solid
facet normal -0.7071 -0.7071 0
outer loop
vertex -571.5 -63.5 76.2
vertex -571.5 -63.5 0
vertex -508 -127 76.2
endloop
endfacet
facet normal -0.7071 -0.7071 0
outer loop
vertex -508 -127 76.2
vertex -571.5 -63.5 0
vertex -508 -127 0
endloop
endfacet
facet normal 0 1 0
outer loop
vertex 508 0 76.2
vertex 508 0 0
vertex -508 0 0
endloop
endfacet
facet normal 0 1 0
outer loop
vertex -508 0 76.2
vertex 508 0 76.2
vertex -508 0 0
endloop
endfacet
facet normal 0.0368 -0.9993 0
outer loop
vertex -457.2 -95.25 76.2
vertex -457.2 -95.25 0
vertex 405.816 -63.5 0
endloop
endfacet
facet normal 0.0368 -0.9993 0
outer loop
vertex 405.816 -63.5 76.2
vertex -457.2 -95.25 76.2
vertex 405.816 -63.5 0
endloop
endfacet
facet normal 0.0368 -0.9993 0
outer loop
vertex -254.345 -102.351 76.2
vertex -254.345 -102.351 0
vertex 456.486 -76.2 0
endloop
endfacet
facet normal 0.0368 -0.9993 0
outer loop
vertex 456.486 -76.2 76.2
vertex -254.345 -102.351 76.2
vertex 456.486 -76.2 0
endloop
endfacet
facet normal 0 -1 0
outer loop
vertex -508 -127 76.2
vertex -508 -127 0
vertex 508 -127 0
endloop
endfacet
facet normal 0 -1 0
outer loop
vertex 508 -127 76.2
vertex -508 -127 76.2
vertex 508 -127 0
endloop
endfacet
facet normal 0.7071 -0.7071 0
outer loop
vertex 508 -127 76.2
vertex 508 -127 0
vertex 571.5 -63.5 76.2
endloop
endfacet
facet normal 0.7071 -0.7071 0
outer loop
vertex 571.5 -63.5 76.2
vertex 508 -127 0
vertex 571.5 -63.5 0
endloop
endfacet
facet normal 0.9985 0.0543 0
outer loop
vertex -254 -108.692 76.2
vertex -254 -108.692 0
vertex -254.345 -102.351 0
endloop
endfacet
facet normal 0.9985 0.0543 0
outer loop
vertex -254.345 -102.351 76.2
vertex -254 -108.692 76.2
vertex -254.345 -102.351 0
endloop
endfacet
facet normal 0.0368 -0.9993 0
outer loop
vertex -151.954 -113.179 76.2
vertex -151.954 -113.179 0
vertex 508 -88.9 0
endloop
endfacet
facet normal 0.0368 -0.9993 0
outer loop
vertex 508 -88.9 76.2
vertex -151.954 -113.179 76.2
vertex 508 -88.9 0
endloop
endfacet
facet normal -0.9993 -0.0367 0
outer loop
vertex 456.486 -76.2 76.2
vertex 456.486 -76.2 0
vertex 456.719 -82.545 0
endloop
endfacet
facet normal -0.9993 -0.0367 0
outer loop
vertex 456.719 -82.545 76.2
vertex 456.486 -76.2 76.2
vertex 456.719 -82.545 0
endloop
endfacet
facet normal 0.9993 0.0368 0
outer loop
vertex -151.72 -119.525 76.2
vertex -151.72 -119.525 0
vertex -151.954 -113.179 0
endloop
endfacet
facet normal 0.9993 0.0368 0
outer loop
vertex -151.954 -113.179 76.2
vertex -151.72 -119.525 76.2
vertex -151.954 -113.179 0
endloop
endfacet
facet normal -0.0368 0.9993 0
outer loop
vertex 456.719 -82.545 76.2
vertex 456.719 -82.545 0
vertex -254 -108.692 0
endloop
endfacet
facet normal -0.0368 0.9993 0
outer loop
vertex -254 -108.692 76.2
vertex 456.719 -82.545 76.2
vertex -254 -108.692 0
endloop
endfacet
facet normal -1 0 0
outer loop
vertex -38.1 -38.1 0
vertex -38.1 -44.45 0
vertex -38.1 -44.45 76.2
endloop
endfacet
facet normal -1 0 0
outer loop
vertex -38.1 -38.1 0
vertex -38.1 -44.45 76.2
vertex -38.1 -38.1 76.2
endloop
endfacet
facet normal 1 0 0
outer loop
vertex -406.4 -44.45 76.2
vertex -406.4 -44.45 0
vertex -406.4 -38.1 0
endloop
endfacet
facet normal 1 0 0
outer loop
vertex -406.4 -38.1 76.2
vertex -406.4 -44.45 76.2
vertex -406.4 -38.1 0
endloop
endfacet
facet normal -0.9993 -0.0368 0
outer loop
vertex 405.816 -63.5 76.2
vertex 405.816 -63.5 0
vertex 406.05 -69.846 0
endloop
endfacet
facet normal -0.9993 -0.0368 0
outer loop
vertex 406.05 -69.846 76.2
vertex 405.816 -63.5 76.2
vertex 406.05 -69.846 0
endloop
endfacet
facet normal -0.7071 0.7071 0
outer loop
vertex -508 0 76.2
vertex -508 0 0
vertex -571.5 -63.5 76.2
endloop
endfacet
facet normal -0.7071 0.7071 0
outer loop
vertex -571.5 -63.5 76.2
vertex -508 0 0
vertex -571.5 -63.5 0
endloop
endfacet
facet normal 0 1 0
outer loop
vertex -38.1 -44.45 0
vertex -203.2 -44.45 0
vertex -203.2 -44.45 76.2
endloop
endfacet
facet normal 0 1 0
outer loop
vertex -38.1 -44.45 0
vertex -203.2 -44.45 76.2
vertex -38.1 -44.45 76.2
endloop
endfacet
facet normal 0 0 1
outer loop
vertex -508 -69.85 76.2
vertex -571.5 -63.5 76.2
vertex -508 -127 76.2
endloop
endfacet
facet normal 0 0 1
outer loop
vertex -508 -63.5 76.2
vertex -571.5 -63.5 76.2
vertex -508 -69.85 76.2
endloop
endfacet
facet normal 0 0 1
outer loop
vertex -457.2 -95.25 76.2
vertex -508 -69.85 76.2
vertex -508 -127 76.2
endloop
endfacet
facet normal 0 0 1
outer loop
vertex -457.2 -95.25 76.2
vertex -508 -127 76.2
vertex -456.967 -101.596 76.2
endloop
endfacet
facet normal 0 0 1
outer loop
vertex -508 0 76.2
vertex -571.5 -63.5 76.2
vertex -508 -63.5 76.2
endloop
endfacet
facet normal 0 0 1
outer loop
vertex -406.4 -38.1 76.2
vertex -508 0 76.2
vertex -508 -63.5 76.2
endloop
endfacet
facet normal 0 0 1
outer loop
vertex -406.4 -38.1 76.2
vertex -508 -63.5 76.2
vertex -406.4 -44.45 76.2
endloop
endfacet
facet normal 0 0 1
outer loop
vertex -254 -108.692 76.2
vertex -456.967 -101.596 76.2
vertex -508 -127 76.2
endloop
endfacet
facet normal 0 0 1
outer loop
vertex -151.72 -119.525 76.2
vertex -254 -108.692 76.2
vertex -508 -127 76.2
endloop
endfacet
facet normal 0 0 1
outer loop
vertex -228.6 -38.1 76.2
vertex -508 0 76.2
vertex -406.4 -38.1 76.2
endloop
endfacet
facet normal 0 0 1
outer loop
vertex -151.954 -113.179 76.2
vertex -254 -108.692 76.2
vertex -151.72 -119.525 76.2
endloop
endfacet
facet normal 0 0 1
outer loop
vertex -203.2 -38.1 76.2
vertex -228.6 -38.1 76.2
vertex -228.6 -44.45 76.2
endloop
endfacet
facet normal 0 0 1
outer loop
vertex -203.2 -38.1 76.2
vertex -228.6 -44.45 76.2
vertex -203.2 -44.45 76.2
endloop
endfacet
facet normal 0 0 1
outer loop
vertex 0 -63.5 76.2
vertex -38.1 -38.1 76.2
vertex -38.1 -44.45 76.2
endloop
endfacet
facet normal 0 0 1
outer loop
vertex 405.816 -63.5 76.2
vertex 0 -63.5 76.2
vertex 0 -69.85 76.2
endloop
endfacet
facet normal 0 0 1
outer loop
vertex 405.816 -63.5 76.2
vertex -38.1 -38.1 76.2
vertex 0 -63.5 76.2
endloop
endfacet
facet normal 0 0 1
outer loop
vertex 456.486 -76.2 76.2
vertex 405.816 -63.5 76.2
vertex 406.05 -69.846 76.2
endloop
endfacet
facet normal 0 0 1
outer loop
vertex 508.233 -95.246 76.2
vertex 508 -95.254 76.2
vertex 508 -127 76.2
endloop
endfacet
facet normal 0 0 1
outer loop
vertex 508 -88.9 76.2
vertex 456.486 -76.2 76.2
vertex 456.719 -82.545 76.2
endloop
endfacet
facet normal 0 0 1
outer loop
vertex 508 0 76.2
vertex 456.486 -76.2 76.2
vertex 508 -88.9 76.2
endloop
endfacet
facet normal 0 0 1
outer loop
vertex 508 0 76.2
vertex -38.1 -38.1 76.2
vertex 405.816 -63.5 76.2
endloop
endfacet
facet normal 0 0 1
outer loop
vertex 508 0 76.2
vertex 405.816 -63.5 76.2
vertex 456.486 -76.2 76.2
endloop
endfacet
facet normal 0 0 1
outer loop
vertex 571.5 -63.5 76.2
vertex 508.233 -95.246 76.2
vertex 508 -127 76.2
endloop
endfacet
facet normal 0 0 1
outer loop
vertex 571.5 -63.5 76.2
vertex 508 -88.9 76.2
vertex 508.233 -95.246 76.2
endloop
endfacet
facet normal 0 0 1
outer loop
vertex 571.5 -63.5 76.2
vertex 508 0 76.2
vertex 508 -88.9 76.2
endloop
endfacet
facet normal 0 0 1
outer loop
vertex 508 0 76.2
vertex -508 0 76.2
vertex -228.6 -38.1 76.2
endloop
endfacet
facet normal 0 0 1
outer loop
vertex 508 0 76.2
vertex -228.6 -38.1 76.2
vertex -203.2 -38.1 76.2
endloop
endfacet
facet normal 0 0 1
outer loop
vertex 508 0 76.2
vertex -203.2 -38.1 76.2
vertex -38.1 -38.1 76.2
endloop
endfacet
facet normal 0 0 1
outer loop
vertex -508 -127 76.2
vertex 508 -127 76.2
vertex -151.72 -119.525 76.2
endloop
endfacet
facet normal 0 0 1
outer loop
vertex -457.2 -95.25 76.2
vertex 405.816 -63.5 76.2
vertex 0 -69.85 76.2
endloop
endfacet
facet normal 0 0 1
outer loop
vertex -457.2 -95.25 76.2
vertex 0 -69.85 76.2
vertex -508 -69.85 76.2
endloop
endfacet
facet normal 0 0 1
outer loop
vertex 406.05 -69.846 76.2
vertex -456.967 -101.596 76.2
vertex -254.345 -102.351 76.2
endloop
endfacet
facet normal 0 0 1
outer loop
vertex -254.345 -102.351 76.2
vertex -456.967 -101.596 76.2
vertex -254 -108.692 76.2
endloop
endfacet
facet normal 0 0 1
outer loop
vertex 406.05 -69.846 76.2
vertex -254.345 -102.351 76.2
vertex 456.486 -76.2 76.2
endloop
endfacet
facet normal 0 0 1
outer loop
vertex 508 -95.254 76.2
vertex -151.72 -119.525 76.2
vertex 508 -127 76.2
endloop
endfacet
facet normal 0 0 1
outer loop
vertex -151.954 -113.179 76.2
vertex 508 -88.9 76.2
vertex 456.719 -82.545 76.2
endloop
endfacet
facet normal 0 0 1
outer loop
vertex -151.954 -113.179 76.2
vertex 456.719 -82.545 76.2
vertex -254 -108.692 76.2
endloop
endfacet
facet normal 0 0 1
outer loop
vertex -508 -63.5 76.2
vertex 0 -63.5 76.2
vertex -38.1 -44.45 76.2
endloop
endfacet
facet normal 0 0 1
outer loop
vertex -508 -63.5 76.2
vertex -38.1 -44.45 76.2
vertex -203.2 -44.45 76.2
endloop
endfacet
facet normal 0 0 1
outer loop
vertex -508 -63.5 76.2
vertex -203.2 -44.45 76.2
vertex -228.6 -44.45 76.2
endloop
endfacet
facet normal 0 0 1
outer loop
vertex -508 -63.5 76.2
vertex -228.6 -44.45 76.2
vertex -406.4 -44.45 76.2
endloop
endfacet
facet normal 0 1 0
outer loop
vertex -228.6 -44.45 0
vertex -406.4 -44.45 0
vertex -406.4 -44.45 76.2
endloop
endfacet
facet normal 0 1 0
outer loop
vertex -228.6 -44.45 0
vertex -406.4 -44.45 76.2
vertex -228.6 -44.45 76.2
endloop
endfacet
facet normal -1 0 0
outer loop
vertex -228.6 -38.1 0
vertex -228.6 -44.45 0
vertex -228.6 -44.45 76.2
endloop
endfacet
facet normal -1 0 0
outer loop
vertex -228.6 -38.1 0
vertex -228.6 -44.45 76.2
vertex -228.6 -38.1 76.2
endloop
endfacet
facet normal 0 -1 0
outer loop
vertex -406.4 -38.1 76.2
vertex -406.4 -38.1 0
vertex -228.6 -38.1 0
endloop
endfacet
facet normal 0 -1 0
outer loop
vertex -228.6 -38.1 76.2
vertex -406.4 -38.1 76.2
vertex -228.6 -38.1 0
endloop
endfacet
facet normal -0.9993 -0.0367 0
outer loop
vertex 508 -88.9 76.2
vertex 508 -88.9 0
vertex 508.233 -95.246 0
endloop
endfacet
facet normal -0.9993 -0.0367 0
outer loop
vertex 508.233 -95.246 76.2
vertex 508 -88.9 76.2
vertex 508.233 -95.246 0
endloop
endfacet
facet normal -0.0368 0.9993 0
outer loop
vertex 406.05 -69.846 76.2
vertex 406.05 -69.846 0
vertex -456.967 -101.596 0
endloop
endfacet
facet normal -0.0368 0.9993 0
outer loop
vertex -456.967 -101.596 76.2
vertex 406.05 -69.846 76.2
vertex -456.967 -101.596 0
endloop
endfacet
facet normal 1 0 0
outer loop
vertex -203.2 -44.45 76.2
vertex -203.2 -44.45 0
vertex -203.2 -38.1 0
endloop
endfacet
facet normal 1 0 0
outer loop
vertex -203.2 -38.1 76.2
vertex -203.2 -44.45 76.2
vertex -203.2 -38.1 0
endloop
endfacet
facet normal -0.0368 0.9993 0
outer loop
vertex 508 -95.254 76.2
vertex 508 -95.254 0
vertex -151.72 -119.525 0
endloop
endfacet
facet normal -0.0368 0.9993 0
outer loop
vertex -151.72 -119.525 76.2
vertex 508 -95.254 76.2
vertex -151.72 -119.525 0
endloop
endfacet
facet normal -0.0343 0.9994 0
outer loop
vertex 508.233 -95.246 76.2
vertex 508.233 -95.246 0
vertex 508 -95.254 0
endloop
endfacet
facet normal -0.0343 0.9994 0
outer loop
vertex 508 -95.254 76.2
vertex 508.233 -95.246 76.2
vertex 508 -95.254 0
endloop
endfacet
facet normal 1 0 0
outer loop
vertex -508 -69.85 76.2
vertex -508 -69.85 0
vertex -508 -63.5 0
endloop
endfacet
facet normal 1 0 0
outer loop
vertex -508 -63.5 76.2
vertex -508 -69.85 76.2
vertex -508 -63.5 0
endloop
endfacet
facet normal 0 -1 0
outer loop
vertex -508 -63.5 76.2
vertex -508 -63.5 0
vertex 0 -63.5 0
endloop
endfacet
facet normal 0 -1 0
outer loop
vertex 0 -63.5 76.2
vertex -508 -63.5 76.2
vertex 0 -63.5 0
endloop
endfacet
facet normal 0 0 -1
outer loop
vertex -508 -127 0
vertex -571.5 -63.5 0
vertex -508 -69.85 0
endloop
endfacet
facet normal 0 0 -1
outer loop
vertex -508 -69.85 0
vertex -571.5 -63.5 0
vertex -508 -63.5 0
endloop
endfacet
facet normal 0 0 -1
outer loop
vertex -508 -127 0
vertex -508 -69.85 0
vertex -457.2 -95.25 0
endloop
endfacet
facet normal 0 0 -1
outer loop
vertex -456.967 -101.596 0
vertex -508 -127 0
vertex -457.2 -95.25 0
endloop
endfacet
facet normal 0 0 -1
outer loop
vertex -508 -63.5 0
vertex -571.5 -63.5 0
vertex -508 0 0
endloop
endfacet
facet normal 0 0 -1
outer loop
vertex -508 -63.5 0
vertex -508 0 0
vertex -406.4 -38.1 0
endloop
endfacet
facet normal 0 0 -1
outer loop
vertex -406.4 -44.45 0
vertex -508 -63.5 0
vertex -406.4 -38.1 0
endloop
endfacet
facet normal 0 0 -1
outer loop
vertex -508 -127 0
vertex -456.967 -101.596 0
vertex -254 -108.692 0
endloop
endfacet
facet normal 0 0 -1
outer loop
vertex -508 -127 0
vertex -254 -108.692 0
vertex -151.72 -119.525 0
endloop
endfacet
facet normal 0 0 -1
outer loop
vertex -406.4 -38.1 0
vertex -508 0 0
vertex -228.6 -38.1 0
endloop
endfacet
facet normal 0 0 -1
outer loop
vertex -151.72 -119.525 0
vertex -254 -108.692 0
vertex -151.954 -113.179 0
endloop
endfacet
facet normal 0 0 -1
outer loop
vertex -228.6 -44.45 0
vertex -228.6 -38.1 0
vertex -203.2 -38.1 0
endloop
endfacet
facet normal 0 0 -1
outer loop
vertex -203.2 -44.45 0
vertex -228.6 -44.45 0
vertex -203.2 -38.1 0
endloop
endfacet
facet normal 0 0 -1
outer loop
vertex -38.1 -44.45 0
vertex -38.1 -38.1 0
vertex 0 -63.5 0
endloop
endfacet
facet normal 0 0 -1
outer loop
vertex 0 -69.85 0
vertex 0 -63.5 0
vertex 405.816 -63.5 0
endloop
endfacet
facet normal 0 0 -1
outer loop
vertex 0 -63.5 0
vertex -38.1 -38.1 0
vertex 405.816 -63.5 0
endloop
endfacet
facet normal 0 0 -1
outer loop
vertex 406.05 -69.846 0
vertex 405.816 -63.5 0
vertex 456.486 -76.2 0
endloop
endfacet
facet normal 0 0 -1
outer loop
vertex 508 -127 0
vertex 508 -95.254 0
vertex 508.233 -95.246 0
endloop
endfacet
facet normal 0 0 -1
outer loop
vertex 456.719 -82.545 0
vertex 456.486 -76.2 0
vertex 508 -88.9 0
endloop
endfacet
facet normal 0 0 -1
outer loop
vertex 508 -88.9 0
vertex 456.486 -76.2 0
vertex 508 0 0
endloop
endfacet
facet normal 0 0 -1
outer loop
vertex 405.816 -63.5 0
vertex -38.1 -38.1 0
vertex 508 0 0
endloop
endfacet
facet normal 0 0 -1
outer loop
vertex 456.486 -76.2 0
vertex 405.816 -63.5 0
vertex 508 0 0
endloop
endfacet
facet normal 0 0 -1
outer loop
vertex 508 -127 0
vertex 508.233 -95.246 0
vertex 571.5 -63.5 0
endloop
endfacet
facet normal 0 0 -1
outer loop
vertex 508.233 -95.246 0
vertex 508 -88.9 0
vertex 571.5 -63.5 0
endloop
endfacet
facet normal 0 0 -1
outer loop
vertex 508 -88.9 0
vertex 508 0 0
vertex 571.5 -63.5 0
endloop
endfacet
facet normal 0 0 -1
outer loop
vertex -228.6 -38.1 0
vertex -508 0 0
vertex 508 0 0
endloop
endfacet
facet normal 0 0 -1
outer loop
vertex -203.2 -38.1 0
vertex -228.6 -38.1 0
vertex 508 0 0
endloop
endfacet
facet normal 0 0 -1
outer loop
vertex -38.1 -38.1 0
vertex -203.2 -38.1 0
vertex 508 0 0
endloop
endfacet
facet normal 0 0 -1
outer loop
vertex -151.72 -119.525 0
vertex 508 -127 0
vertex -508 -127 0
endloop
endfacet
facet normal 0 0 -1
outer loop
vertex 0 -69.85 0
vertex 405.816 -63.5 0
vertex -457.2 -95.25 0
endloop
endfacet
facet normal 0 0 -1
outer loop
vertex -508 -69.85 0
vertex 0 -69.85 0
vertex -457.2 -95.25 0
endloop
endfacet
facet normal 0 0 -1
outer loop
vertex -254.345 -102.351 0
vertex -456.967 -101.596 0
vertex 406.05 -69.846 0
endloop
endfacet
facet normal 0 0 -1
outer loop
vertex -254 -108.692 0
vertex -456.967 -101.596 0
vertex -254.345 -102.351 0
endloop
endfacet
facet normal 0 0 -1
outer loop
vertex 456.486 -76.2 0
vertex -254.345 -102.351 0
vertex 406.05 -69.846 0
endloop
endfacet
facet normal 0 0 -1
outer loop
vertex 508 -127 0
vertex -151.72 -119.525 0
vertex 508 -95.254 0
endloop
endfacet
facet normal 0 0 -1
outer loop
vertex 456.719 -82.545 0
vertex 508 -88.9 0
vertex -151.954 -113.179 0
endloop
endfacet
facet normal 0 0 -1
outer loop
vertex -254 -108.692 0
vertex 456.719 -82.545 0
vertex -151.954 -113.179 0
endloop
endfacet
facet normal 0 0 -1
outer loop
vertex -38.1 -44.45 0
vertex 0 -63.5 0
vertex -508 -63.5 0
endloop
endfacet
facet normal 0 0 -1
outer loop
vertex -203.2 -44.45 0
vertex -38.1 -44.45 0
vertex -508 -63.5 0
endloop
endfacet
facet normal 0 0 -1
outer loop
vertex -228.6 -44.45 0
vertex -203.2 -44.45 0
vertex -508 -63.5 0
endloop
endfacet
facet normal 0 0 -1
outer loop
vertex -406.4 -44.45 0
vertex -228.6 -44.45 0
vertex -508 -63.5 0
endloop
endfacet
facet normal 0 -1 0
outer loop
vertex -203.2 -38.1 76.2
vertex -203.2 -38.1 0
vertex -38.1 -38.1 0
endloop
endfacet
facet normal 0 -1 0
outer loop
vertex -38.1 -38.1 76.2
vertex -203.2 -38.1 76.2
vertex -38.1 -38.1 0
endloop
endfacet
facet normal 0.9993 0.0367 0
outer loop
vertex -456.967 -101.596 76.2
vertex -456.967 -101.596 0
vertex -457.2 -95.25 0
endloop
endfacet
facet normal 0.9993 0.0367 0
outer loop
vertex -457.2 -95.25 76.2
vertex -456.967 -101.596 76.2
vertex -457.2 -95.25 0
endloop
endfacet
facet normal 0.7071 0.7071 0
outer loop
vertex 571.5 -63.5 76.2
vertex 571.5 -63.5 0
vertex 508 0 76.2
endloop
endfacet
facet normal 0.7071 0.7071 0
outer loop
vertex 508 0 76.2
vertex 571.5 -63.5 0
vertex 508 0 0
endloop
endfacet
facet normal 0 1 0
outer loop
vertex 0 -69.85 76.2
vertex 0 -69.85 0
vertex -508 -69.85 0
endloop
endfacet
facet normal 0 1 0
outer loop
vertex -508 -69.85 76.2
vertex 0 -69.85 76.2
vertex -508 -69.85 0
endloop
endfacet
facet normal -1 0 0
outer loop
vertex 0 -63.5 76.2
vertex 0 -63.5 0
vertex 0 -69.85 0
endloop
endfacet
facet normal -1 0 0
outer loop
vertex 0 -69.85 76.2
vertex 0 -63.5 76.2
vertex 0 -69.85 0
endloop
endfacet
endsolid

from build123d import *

# Parameters (mm, degrees)
F0_W     = 177.8
F0_H     = 6.35
F0_W_2   = 165.1
F1_DEPTH = 76.2


with BuildPart() as f1:
    # F0 (on Top) → F1 (new body)
    with BuildSketch(Plane.XY):
        Polygon((508, 0), (-508, 0), (-508, -63.5), (0, -63.5), (405.8161629425, -63.5), (508, -63.5), align=None)
        with Locations((-317.5, -41.275)):
            Rectangle(F0_W, F0_H, mode=Mode.SUBTRACT)
        with Locations((-120.65, -41.275)):
            Rectangle(F0_W_2, F0_H, mode=Mode.SUBTRACT)
        Polygon((-508, -63.5), (-508, 0), (-571.5, -63.5), align=None)
        Polygon((571.5, -63.5), (508, 0), (508, -63.5), align=None)
        Polygon((-508, -69.85), (-508, -63.5), (-571.5, -63.5), (-508, -127), align=None)
        Polygon((571.5, -63.5), (508, -63.5), (508, -88.9), (508.2334558824, -95.2457070805), (508, -95.2542958237), (508, -127), align=None)
        Polygon((508, -88.9), (508, -63.5), (405.8161629425, -63.5), (0, -63.5), (0, -69.85), (-508, -69.85), (-508, -127), (508, -127), (508, -95.2542958237), (-151.7200804854, -119.5251188452), (-151.9535363678, -113.1794117647), align=None)
        Polygon((-457.2, -95.25), (405.8161629425, -63.5), (406.0496188249, -69.8457070805), (-456.9665441176, -101.5957070805), align=None, mode=Mode.SUBTRACT)
        Polygon((456.7191930115, -82.5447314139), (-254, -108.6917902374), (-254.3446927927, -102.351152503), (456.4857730235, -76.2), align=None, mode=Mode.SUBTRACT)
    extrude(amount=F1_DEPTH)


solid = f1.part
